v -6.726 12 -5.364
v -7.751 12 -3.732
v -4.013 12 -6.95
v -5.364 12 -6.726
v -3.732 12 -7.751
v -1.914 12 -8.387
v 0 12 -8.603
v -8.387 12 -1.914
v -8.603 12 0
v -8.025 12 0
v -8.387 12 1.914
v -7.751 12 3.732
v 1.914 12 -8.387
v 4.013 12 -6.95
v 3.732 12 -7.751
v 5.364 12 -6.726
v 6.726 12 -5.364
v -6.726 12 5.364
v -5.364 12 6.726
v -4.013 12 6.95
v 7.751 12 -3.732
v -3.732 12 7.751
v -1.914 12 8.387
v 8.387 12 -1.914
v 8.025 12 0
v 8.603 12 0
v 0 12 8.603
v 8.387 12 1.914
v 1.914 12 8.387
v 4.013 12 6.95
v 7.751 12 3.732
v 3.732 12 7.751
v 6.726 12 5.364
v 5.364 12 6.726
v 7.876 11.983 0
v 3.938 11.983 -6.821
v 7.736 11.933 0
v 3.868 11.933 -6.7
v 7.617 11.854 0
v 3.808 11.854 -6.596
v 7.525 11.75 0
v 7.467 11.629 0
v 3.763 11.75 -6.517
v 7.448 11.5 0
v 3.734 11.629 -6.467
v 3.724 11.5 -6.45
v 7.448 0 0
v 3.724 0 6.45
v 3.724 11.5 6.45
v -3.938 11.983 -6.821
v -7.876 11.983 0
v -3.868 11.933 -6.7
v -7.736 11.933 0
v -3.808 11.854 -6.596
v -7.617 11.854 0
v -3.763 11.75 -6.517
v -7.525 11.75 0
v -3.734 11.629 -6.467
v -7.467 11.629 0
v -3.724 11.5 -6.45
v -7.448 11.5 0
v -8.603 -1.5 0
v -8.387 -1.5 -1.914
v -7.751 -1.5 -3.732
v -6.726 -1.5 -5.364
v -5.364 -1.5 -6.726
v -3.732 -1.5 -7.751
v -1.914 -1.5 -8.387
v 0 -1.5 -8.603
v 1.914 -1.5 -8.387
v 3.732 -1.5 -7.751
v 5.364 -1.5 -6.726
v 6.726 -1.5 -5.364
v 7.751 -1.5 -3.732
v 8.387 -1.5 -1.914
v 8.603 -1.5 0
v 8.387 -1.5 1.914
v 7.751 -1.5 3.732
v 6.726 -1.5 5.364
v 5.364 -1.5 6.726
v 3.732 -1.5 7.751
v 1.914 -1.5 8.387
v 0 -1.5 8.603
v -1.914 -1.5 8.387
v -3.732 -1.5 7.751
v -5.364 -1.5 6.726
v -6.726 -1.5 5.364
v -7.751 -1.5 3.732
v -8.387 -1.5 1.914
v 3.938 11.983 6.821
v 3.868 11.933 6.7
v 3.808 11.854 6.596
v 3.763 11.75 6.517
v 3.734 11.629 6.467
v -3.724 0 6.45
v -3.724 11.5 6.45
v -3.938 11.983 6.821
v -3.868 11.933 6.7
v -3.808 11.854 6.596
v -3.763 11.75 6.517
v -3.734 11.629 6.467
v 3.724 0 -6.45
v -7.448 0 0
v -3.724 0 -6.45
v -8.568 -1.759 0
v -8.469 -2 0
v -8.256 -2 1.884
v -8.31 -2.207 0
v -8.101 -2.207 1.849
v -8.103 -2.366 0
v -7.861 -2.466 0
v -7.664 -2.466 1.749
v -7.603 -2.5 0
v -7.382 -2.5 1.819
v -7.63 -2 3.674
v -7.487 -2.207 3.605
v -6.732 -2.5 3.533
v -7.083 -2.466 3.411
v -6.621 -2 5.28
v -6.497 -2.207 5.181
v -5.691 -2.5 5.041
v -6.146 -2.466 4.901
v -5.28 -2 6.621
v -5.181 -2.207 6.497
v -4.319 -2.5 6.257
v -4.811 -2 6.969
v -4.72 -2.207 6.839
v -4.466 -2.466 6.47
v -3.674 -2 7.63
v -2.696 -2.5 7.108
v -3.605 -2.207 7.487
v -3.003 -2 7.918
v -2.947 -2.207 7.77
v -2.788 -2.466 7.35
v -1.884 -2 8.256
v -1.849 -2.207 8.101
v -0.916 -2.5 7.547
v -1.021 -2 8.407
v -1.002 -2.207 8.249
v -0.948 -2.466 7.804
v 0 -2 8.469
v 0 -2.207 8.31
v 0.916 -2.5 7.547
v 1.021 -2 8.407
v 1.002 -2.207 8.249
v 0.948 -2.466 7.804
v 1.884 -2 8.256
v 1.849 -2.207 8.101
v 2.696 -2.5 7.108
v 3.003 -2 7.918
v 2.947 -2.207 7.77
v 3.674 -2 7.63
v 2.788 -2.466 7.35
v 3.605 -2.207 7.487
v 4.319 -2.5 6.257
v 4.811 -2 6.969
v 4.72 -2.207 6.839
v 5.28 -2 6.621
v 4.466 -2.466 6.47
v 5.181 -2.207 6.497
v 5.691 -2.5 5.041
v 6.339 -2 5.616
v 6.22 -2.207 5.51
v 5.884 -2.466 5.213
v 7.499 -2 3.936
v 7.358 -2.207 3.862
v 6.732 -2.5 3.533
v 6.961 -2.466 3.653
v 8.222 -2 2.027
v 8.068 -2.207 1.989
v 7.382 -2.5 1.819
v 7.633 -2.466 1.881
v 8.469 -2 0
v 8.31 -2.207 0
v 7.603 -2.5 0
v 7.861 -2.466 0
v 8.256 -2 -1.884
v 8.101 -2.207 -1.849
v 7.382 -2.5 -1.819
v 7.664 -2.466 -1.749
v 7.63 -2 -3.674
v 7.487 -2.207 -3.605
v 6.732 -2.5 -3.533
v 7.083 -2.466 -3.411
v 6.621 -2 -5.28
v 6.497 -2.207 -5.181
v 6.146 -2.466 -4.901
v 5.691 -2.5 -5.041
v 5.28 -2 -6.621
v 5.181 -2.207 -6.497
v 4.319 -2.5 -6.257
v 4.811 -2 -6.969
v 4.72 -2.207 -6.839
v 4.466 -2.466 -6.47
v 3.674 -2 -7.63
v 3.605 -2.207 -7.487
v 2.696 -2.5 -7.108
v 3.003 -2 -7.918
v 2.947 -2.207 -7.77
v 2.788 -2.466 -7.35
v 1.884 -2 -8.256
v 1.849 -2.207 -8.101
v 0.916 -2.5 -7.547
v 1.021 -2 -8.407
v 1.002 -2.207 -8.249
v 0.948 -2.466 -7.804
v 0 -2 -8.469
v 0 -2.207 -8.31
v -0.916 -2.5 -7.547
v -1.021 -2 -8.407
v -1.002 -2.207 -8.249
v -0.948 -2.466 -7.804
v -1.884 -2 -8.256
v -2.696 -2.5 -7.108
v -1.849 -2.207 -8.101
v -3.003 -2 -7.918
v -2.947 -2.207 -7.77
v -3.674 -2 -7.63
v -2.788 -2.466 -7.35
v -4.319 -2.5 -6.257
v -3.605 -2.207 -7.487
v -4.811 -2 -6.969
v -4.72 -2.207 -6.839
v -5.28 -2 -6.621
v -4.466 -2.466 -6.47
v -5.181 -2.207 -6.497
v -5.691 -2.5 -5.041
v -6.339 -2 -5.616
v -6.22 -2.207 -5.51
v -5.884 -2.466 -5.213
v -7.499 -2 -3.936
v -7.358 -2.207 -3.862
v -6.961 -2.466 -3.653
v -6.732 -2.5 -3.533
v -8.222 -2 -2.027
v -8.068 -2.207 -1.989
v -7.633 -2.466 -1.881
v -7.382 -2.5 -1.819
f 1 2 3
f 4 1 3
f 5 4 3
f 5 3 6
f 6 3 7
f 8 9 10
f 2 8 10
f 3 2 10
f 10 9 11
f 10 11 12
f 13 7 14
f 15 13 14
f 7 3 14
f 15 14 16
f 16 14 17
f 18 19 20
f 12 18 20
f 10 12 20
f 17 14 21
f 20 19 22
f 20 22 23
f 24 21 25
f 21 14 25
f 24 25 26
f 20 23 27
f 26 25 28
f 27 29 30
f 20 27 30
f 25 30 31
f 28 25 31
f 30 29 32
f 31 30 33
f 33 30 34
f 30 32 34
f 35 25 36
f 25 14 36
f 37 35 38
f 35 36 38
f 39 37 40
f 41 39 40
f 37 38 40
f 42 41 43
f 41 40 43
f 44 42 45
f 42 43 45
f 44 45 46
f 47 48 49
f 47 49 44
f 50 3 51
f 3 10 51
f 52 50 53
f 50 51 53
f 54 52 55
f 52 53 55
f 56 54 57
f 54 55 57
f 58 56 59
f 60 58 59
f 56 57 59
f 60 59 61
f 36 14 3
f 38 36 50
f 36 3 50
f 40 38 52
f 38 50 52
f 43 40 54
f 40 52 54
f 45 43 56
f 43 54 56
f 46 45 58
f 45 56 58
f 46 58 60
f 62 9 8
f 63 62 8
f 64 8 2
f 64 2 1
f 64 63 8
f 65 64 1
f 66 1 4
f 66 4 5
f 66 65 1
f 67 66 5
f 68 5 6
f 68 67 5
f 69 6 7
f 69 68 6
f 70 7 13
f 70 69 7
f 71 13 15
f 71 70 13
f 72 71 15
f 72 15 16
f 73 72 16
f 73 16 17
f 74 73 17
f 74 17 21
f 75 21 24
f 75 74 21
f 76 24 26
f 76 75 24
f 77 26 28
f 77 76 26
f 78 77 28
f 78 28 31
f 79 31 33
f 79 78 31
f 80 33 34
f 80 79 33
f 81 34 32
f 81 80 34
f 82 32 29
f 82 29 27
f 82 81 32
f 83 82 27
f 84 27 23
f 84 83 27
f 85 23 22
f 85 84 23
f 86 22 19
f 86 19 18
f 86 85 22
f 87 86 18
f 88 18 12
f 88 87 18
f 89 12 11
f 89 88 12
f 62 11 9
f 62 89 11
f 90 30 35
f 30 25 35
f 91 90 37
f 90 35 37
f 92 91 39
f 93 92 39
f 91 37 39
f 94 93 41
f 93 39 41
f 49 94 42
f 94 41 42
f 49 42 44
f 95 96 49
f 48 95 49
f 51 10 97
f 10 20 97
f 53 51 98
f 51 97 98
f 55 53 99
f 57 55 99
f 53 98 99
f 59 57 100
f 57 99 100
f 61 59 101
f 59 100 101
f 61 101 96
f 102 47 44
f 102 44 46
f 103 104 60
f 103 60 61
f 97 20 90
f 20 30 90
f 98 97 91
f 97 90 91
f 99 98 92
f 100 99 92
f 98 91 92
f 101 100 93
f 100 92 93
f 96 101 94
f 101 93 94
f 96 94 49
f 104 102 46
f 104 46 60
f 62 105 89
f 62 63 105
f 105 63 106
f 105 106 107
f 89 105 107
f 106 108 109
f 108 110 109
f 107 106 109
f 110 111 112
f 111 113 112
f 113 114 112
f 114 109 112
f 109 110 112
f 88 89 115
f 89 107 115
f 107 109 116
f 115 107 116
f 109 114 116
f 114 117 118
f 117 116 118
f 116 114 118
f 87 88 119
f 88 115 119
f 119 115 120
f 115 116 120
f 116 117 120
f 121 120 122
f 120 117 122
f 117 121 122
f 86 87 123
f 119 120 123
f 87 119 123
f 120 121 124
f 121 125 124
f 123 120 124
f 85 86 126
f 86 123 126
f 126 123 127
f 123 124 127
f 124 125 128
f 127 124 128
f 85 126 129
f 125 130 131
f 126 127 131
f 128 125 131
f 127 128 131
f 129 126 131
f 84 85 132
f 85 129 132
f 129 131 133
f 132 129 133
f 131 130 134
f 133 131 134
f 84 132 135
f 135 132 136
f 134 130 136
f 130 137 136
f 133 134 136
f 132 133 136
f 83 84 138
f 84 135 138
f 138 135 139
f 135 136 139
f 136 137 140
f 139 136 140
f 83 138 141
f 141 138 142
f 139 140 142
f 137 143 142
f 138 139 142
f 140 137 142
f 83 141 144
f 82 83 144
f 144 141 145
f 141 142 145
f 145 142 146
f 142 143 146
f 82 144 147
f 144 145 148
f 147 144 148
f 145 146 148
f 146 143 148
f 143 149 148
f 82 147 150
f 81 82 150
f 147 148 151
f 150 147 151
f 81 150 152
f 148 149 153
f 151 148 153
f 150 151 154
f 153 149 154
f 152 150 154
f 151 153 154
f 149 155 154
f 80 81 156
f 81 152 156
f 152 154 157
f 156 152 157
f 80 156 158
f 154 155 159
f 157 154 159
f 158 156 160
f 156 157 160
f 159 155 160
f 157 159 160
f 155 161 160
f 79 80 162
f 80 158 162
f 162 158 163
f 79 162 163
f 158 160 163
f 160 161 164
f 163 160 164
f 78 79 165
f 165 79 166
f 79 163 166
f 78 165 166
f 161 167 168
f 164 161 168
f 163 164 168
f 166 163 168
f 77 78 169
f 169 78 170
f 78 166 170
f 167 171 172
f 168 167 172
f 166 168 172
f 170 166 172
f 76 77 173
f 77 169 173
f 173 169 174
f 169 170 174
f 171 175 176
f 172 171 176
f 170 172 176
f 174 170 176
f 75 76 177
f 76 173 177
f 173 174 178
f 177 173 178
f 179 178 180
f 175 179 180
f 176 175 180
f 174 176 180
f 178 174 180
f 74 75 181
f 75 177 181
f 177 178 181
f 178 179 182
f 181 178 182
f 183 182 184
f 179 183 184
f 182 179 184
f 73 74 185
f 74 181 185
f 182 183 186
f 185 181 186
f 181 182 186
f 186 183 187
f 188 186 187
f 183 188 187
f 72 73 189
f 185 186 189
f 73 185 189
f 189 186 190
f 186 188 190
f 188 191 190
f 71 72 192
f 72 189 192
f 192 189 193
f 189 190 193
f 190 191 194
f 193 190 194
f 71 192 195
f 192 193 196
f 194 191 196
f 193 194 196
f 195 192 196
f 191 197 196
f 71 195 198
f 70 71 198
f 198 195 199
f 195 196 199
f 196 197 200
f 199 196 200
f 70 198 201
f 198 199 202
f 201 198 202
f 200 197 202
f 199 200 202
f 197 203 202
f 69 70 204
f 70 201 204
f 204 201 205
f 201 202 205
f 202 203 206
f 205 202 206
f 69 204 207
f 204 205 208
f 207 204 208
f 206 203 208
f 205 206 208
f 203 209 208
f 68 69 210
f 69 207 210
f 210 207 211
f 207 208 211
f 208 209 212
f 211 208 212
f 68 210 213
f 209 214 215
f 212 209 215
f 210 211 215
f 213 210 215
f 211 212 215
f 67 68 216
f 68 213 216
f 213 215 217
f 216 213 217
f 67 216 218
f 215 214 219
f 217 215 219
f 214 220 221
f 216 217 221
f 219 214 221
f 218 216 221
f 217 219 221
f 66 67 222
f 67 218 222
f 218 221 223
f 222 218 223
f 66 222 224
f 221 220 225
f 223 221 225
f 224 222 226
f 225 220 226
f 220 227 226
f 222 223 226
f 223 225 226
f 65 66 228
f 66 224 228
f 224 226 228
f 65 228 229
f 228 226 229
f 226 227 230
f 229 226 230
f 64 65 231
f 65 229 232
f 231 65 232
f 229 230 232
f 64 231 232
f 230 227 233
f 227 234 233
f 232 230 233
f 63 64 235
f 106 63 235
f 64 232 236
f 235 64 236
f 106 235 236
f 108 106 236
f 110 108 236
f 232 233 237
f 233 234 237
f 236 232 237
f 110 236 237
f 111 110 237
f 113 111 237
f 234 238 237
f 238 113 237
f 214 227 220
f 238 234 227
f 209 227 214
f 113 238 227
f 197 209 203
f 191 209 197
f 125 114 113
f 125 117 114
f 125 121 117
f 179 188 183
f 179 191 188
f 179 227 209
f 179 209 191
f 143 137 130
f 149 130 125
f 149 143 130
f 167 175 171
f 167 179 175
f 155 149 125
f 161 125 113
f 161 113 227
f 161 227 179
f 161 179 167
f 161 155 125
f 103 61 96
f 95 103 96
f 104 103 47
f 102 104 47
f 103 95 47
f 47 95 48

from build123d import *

# Parameters (mm, degrees)
SALIENTE_EXTRUIR1_DEPTH = 12
SALIENTE_EXTRUIR2_DEPTH = 2.5
REDONDEO2_R             = 0.5
SALIENTE_EXTRUIR4_DEPTH = 14.5
REDONDEO5_R             = 1


with BuildPart() as part:
    # Croquis1 → Saliente-Extruir1 (new body)
    with BuildSketch(Plane(origin=(0, 0, 0), x_dir=(1, 0, 0), z_dir=(0, 1, 0))):
        Polygon((8.602519010925427, 1.1e-16), (4.301259505462714, 7.45), (-4.30125950546271, 7.450000000000001), (-8.602519010925425, 1.1e-16), (-4.301259505462709, -7.450000000000002), (4.301259505462713, -7.450000000000001), align=None)
        Polygon((-3.723909236273085, 6.45), (-7.447818472546173, 8.7e-16), (-3.723909236273083, -6.450000000000002), (3.723909236273086, -6.450000000000001), (7.4478184725461745, 0), (3.7239092362730872, 6.45), align=None, mode=Mode.SUBTRACT)
    extrude(amount=SALIENTE_EXTRUIR1_DEPTH)

    # Croquis2 → Saliente-Extruir2 (add)
    with BuildSketch(Plane.XZ):
        Polygon((8.602519010925427, -1.1e-16), (4.301259505462713, 7.450000000000001), (-4.301259505462709, 7.450000000000002), (-8.602519010925425, -1.1e-16), (-4.30125950546271, -7.450000000000001), (4.301259505462714, -7.45), align=None)
    extrude(amount=SALIENTE_EXTRUIR2_DEPTH)

    # Redondeo2
    redondeo2_edges = [part.edges().sort_by_distance(p)[0] for p in [
        (8.9e-16, 12, -6.45),
        (-5.585863854409629, 12, -3.2250000000000005),
        (-5.585863854409627, 12, 3.2250000000000005),
        (1.78e-15, 12, 6.450000000000001),
        (5.585863854409631, 12, 3.2250000000000005),
        (5.585863854409631, 12, -3.225),
    ]]
    fillet(redondeo2_edges, radius=REDONDEO2_R)

    # Croquis3 → Saliente-Extruir4 (add)
    with BuildSketch(Plane.XZ.offset(2.5)):
        with BuildLine():
            Line((4.301259505462713, 7.450000000000002), (8.602519010925427, -1.1e-16))
            ThreePointArc((8.602519010925423, 0), (7.45, 4.301259505462711), (4.3012595054627125, 7.449999999999999))
        make_face()
        with BuildLine():
            ThreePointArc((4.3012595054627125, 7.449999999999999), (5.3e-16, 8.602519010925423), (-4.30125950546271, 7.45))
            Line((-4.30125950546271, 7.450000000000002), (4.301259505462713, 7.450000000000001))
        make_face()
        with BuildLine():
            ThreePointArc((-4.30125950546271, 7.45), (-7.449999999999998, 4.301259505462714), (-8.602519010925423, 1.05e-15))
            Line((-8.602519010925425, 0), (-4.301259505462709, 7.450000000000002))
        make_face()
        with BuildLine():
            ThreePointArc((-8.602519010925423, 1.05e-15), (-7.449999999999999, -4.3012595054627125), (-4.301259505462708, -7.450000000000001))
            Line((-4.30125950546271, -7.450000000000001), (-8.602519010925425, -1.1e-16))
        make_face()
        with BuildLine():
            Line((4.301259505462713, -7.45), (-4.30125950546271, -7.450000000000001))
            ThreePointArc((-4.301259505462708, -7.450000000000001), (-1.58e-15, -8.602519010925423), (4.3012595054627125, -7.449999999999999))
        make_face()
        with BuildLine():
            Line((8.602519010925427, 0), (4.301259505462714, -7.45))
            ThreePointArc((4.3012595054627125, -7.449999999999999), (7.450000000000001, -4.301259505462709), (8.602519010925423, -2.11e-15))
        make_face()
    extrude(amount=-SALIENTE_EXTRUIR4_DEPTH)

    # Redondeo5
    redondeo5_edges = [part.edges().sort_by_distance(p)[0] for p in [
        (8.602519010925413, -2.5, 5.94e-15),
    ]]
    fillet(redondeo5_edges, radius=REDONDEO5_R)


solid = part.part
